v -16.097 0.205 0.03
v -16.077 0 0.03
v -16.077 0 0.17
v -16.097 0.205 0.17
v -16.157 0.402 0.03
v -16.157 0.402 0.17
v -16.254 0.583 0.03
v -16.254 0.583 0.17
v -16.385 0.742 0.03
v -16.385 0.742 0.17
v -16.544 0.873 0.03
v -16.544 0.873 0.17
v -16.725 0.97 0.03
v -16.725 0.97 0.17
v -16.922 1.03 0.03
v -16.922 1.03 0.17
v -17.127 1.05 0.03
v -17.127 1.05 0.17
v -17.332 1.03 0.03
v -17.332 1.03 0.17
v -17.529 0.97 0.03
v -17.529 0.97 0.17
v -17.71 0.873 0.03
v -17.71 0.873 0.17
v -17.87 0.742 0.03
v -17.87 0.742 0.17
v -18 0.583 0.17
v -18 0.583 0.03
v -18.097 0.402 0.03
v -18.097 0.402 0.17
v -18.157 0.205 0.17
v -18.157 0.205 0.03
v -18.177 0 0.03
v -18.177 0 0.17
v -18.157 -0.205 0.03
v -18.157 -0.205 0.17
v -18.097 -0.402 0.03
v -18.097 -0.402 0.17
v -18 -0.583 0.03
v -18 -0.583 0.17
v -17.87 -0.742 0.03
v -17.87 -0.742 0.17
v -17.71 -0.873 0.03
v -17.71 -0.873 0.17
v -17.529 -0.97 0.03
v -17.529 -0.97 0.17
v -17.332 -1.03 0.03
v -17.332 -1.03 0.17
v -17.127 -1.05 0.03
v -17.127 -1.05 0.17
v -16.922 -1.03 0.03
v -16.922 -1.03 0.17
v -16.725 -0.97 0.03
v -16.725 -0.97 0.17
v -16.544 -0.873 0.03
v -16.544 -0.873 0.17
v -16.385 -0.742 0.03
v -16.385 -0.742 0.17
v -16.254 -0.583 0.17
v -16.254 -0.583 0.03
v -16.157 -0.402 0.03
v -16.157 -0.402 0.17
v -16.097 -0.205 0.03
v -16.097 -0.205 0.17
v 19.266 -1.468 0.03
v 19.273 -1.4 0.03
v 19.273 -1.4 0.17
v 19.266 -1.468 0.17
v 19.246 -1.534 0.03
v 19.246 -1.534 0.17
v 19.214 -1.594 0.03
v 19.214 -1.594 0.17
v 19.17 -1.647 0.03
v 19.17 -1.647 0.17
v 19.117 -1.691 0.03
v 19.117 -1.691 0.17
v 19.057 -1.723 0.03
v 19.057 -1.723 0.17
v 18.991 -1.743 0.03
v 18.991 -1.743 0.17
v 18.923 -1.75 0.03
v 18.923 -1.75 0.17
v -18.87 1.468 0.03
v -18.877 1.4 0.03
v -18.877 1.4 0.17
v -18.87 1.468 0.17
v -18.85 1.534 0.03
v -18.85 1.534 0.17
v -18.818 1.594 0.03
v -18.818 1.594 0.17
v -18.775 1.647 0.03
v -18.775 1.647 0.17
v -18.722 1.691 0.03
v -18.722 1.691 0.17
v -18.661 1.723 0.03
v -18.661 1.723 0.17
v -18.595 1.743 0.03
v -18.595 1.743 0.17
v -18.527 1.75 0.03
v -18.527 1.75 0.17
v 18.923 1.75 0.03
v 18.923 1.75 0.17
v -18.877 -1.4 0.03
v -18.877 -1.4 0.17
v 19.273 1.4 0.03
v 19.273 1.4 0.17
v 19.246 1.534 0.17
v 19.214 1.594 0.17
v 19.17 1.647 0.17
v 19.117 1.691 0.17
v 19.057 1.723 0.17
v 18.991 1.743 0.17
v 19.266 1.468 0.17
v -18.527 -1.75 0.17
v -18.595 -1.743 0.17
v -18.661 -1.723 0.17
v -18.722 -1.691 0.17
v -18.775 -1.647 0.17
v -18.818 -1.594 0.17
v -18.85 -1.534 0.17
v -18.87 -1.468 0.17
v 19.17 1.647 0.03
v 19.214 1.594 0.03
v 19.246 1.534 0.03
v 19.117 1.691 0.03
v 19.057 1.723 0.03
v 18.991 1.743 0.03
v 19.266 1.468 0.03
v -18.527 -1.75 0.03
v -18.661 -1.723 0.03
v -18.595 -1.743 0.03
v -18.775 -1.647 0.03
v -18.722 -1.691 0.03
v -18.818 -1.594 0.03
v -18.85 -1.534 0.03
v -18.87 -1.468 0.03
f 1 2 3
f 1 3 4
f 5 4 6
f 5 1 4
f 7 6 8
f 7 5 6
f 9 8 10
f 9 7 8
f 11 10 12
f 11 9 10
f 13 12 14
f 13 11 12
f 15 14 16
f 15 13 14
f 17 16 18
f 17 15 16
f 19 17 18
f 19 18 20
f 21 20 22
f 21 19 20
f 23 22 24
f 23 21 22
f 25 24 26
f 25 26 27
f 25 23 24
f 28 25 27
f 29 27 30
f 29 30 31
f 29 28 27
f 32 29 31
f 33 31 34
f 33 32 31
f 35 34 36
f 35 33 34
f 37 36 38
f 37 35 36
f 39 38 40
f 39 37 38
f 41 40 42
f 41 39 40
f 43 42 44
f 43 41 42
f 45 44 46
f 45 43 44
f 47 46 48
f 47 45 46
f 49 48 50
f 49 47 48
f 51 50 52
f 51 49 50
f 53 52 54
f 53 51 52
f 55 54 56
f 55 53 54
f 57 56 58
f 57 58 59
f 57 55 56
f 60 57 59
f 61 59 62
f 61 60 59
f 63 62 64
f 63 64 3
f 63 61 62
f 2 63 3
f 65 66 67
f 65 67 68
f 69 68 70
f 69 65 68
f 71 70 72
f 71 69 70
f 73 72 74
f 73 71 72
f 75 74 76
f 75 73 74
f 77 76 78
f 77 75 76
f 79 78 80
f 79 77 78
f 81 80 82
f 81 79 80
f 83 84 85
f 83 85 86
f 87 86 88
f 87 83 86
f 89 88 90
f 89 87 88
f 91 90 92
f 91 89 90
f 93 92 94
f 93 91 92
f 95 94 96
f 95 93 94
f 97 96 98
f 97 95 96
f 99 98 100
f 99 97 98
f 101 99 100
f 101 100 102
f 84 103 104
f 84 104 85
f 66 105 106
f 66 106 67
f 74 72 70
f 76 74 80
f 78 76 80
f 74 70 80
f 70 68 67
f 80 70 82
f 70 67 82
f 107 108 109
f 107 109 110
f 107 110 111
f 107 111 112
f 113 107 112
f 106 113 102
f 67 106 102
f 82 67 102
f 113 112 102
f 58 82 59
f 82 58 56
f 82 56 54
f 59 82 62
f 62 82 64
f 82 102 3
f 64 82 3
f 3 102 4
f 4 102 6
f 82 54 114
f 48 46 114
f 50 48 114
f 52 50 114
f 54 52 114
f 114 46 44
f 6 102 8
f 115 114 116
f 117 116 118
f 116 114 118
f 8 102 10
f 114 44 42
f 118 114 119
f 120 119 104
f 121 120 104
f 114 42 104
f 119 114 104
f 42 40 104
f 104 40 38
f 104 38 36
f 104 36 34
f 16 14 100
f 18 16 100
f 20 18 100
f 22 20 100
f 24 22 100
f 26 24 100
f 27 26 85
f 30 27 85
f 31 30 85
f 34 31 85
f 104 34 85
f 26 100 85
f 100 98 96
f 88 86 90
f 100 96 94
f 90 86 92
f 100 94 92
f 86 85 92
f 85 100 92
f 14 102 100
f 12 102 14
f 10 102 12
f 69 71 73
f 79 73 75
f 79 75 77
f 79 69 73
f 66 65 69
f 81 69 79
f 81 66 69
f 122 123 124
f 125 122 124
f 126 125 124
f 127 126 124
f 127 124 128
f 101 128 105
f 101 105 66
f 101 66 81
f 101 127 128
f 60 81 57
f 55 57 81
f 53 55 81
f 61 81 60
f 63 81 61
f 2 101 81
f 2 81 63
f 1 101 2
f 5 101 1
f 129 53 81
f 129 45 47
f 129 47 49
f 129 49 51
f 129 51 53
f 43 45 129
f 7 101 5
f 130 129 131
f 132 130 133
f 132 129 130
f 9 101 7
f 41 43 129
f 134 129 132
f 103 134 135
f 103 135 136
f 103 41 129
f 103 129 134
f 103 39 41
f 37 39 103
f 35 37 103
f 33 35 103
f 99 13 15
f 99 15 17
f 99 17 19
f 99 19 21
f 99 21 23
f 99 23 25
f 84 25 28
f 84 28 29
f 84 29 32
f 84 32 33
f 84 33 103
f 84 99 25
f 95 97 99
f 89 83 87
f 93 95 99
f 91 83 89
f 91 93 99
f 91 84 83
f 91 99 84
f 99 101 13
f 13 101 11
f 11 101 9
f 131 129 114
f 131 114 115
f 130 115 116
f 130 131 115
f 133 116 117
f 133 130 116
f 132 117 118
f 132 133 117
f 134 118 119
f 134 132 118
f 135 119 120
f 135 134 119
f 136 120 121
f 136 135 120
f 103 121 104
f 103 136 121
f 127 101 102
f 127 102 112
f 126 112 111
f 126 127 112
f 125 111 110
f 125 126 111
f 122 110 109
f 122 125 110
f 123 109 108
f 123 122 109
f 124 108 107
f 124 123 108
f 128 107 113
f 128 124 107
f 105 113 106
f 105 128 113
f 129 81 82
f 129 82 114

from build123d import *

# Parameters (mm, degrees)
SKETCH1_R           = 1.5
BOSS_EXTRUDE1_DEPTH = 0.2
SCALE6_SCALE        = 0.7


with BuildPart() as part:
    # Sketch1 → Boss-Extrude1 (new body)
    with BuildSketch(Plane.XY):
        with BuildLine():
            Line((-26.75, 2.5), (26.75, 2.5))
            ThreePointArc((26.75, 2.5), (27.103553391, 2.353553391), (27.25, 2))
            Line((27.25, 2), (27.25, -2))
            ThreePointArc((27.25, -2), (27.103553391, -2.353553391), (26.75, -2.5))
            Line((26.75, -2.5), (-26.75, -2.5))
            ThreePointArc((-26.75, -2.5), (-27.103553391, -2.353553391), (-27.25, -2))
            Line((-27.25, -2), (-27.25, 2))
            ThreePointArc((-27.25, 2), (-27.103553391, 2.353553391), (-26.75, 2.5))
        make_face()
        with Locations((-24.75, 0)):
            Circle(SKETCH1_R, mode=Mode.SUBTRACT)
    extrude(amount=BOSS_EXTRUDE1_DEPTH)


with BuildPart() as part_1:
    # Scale6: scaled about (0.659639326, 0, 0.1)
    add(part.part.scale(SCALE6_SCALE).moved(Location((0.197891798, 0, 0.03))))


solid = part_1.part
